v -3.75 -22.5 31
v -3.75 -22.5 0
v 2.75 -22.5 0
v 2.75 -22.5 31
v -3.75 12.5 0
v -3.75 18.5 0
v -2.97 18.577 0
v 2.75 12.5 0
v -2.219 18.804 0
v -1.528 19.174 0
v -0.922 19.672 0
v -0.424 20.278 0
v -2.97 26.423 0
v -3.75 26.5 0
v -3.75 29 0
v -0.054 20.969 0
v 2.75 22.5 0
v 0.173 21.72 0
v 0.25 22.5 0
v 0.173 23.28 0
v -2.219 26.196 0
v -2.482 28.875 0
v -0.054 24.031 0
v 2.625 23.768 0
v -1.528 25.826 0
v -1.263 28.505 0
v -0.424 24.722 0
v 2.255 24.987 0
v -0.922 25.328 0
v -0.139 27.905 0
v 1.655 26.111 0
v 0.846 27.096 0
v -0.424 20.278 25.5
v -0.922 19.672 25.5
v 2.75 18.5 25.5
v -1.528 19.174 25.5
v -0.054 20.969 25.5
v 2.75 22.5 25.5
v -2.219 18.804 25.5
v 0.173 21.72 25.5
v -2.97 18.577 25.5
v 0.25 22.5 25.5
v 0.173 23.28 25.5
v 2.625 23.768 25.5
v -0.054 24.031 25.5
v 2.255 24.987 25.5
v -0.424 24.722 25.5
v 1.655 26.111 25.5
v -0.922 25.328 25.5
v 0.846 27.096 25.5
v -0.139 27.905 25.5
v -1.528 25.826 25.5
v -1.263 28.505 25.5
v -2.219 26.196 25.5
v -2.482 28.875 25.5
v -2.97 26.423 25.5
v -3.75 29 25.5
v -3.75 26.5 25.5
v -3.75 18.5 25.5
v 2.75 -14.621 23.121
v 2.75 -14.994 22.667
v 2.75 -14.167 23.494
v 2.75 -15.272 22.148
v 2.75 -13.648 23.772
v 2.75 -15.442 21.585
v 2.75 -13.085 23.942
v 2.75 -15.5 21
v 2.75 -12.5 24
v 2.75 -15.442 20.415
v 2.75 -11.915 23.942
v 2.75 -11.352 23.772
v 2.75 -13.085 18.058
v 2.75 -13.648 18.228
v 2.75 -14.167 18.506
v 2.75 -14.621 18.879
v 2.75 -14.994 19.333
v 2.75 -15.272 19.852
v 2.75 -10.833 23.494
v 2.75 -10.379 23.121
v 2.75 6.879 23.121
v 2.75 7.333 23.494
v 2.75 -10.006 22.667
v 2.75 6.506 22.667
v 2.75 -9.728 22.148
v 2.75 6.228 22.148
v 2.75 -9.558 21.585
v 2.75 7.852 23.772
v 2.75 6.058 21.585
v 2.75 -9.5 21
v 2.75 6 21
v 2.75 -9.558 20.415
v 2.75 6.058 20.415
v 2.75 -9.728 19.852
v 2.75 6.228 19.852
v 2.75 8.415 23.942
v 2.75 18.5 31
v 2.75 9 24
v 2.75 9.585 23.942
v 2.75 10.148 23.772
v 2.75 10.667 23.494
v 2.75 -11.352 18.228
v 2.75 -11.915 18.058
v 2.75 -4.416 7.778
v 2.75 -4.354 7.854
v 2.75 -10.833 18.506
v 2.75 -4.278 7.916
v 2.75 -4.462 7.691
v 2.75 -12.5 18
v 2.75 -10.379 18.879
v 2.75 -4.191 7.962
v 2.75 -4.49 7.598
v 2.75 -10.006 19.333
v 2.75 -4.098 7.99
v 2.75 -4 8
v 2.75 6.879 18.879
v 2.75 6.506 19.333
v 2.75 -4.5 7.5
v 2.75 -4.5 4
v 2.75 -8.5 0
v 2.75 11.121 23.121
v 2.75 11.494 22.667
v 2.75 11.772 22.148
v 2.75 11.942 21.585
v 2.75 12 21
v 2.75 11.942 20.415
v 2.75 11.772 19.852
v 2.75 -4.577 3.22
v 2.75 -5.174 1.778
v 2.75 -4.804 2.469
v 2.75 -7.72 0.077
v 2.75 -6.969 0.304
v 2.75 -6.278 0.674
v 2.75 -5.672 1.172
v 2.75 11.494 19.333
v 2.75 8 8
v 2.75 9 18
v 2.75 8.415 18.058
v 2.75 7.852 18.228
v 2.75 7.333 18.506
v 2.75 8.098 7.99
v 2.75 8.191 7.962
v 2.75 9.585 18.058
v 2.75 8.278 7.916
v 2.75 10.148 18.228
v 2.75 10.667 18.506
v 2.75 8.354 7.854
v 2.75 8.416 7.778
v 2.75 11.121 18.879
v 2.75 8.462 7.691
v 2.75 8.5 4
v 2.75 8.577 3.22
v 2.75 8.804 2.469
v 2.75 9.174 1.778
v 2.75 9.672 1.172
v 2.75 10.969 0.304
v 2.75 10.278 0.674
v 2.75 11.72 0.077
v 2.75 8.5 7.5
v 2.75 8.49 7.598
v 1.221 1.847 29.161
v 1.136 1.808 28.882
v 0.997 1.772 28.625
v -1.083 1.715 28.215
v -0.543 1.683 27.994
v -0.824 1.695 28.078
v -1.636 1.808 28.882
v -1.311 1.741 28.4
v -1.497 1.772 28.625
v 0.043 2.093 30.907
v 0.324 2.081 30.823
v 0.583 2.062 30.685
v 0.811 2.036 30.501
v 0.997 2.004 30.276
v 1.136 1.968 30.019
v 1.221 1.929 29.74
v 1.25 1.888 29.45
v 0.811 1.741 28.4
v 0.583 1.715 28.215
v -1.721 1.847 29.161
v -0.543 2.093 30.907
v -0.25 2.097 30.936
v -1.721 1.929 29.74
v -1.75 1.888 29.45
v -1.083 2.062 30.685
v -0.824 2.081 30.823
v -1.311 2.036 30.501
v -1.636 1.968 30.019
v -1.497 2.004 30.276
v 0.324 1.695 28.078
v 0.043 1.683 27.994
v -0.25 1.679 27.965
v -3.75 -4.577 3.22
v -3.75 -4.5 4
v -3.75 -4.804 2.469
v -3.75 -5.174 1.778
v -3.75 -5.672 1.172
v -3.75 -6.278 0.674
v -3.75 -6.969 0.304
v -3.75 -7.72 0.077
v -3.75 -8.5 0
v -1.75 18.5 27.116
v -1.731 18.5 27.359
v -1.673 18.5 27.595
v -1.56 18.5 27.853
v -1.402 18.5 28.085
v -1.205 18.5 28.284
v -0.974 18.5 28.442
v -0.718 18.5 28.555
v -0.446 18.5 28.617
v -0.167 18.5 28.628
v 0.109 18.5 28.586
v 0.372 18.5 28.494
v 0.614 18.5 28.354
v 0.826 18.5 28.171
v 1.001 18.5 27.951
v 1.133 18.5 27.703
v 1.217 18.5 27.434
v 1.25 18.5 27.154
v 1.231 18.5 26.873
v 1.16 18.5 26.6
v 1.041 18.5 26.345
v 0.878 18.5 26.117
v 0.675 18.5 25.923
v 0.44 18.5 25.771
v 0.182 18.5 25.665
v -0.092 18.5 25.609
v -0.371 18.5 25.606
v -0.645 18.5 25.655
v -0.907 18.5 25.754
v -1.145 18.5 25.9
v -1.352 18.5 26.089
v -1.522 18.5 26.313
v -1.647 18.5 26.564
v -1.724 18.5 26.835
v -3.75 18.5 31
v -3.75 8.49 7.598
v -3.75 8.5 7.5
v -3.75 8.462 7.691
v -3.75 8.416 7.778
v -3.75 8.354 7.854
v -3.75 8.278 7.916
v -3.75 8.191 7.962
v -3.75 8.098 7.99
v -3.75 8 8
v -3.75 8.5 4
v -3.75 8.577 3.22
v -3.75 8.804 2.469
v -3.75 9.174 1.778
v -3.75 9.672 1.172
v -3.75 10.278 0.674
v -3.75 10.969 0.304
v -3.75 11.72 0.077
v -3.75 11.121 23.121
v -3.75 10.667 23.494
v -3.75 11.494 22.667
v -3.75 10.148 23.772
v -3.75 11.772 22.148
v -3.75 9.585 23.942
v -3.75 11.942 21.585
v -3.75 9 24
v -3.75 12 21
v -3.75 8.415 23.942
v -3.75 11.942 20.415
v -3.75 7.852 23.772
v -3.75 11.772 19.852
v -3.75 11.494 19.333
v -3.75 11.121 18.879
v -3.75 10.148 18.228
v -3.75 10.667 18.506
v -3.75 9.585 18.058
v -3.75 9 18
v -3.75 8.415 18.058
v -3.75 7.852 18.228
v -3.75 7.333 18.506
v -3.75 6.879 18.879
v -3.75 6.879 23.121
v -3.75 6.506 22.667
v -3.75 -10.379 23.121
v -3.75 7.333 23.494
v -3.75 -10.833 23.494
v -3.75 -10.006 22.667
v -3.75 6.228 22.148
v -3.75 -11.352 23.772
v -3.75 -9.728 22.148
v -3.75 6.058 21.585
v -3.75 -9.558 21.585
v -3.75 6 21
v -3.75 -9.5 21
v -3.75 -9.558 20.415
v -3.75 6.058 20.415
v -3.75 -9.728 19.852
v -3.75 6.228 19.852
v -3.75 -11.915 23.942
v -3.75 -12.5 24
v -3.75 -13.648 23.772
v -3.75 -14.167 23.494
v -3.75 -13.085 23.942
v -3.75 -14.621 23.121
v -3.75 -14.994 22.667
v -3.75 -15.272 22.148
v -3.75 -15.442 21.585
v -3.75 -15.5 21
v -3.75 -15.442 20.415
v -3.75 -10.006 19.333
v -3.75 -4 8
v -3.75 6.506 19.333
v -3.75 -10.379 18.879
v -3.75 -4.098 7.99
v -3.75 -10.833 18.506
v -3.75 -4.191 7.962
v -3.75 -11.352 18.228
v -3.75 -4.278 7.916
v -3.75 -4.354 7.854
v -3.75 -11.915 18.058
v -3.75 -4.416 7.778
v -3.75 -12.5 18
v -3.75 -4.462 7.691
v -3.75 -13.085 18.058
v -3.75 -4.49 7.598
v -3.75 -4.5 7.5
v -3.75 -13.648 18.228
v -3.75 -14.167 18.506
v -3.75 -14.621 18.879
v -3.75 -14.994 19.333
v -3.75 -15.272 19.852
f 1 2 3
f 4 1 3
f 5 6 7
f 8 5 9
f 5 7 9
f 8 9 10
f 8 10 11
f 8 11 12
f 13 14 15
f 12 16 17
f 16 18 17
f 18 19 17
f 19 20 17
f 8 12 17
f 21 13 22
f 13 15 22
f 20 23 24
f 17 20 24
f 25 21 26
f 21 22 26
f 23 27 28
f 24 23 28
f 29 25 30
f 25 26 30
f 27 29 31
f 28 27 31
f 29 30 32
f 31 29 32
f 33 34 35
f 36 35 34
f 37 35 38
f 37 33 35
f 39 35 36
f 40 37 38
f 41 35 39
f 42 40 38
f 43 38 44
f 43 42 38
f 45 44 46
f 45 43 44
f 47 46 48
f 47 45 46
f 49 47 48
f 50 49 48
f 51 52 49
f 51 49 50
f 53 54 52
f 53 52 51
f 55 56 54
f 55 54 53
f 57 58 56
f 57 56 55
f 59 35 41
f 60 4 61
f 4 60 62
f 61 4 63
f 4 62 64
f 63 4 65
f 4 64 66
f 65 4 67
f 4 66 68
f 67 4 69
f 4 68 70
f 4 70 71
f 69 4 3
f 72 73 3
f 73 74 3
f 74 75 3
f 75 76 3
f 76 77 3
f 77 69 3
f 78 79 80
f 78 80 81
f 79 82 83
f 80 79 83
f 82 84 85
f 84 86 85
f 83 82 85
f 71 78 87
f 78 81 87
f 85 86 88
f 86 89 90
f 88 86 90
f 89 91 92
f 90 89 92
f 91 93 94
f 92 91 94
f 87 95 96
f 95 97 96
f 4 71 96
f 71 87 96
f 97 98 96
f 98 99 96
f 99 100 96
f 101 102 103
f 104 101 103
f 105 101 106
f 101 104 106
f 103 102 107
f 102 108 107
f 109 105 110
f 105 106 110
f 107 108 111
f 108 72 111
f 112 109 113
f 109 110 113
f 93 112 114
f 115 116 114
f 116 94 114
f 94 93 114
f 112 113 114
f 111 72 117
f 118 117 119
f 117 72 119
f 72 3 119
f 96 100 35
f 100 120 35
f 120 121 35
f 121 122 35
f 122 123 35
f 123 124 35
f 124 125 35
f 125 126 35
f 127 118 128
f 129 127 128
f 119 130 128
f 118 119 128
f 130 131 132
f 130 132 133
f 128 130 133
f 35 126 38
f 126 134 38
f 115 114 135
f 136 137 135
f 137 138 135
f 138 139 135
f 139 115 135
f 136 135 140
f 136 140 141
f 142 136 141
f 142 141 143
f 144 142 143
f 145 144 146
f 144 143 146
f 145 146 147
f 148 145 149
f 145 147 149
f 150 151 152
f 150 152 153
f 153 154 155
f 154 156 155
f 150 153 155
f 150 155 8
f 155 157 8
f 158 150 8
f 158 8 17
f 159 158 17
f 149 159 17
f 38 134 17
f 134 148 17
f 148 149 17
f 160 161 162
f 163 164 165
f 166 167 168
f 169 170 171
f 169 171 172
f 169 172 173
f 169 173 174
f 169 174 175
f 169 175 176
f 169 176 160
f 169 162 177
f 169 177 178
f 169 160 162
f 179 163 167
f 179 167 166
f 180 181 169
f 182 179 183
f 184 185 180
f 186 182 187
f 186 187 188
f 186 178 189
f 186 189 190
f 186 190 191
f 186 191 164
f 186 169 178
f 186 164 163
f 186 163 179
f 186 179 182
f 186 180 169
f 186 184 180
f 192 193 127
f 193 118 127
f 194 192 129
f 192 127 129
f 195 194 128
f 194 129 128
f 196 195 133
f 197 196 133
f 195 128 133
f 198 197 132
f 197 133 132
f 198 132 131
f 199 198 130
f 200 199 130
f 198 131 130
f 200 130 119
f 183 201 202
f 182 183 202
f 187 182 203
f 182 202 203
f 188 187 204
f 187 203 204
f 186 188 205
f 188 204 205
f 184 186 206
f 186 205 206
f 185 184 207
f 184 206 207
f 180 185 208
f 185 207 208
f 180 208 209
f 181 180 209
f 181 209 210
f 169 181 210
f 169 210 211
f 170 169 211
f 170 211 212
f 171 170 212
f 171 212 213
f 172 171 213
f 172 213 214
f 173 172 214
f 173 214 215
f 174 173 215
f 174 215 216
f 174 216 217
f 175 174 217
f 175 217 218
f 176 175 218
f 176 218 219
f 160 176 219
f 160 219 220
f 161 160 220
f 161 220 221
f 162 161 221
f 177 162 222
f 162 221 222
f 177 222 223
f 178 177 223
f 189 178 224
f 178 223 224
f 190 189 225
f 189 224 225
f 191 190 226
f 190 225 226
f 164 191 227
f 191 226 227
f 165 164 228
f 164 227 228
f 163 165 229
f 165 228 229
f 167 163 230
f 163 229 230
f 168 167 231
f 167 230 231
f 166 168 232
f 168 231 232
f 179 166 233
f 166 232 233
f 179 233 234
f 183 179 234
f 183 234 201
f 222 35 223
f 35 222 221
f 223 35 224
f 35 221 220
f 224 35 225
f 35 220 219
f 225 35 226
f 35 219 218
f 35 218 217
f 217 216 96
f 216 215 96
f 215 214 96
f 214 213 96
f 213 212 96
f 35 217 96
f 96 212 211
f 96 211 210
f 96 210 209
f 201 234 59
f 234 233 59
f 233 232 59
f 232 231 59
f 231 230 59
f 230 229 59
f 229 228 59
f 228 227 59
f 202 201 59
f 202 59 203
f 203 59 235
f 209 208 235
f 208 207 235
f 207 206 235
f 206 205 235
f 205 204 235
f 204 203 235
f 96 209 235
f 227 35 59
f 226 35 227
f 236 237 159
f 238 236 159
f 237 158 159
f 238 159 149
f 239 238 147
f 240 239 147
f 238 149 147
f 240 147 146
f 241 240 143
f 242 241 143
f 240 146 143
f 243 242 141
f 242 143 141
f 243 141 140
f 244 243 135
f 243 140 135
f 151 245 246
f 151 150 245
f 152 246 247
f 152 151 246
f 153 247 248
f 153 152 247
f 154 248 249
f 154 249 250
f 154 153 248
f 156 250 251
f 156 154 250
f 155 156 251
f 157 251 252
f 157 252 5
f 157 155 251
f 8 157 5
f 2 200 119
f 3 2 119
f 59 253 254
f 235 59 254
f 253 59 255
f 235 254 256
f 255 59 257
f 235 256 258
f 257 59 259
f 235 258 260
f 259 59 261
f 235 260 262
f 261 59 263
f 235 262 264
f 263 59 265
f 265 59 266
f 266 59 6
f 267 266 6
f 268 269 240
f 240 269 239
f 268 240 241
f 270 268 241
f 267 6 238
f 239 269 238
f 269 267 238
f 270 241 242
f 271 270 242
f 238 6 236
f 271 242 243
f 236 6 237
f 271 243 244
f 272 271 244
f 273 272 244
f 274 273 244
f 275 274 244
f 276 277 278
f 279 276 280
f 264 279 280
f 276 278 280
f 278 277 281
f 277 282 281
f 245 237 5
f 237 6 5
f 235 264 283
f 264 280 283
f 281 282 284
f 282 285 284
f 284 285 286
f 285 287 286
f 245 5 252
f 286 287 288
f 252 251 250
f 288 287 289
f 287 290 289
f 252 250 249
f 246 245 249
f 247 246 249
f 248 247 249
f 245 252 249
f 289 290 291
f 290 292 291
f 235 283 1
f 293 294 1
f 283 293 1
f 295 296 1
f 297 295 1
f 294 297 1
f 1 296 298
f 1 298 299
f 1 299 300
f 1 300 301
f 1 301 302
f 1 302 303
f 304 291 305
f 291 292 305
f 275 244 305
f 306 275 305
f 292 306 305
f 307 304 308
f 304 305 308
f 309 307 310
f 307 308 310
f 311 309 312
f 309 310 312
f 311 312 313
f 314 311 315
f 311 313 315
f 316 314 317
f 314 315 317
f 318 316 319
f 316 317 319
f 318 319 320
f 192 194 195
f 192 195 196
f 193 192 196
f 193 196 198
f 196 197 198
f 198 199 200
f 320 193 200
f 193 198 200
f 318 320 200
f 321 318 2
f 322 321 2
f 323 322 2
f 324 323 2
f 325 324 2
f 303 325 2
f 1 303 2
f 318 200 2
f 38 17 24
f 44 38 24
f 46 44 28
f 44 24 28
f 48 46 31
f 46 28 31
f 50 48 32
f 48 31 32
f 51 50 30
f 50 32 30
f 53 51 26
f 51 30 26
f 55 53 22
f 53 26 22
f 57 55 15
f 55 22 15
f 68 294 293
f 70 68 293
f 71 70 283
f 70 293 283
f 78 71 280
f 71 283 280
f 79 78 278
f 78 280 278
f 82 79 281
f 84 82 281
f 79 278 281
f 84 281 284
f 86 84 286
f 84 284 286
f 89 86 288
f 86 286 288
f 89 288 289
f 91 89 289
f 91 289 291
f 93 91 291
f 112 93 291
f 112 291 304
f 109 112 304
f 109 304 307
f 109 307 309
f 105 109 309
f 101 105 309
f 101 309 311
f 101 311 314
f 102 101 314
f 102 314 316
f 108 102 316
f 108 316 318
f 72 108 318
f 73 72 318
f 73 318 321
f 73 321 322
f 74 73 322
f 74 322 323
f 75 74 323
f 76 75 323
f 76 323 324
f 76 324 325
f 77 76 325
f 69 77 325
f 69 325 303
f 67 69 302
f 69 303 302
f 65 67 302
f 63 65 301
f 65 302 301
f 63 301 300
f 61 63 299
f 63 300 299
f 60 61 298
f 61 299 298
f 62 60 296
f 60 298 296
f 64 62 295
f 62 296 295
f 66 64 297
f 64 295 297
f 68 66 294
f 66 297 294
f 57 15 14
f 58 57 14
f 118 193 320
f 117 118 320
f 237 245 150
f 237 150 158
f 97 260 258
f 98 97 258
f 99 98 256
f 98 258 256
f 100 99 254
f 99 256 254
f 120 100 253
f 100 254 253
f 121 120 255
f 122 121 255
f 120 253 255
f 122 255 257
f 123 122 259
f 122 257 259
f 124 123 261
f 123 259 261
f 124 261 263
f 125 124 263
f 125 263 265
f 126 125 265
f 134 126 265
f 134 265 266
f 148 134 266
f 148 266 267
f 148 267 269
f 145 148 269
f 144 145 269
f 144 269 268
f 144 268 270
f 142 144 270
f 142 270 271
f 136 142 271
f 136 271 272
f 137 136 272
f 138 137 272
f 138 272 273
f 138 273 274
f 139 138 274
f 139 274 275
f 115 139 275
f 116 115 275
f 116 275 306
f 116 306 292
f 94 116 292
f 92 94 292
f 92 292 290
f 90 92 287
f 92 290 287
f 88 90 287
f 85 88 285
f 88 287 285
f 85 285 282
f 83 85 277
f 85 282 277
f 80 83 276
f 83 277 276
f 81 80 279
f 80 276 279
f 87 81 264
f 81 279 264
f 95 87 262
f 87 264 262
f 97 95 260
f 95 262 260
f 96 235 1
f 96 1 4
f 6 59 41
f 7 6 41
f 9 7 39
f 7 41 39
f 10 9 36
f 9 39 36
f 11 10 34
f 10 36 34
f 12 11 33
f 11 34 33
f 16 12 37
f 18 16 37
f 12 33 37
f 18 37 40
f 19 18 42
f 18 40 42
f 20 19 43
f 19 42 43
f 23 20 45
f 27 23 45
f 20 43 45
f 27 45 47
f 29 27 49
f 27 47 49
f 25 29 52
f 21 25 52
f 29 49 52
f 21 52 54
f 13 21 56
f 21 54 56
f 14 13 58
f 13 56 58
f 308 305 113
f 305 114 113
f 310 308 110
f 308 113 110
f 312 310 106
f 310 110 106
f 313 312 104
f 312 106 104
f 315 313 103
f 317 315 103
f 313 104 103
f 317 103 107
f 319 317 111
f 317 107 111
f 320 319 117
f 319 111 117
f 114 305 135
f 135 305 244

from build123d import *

# Parameters (mm, degrees)
BOSS_EXTRUDE1_DEPTH = 31
SKETCH2_W           = 5.5
SKETCH2_H           = 10.5
CUT_EXTRUDE1_DEPTH  = 7.5
SKETCH3_R           = 3
CUT_EXTRUDE2_DEPTH  = 7.5
CUT_EXTRUDE5_REACH  = 8.5
SKETCH6_W           = 8
SKETCH6_H           = 13
FILLET1_R           = 0.5
FILLET2_R           = 4
CUT_EXTRUDE7_REACH  = 27.5
SKETCH9_R           = 1.5
CUT_EXTRUDE8_DEPTH  = 17


with BuildPart() as part:
    # Sketch1 → Boss-Extrude1 (new body)
    with BuildSketch(Plane.XY):
        with BuildLine():
            Line((-3.75, 29), (-3.75, 22.5))
            Line((-3.75, 22.5), (-3.75, -22.5))
            Line((-3.75, -22.5), (2.75, -22.5))
            Line((2.75, -22.5), (2.75, 22.5))
            ThreePointArc((2.75, 22.5), (0.846194078, 27.096194078), (-3.75, 29))
        make_face()
    extrude(amount=BOSS_EXTRUDE1_DEPTH)

    # Sketch2 → Cut-Extrude1 (cut, through all)
    with BuildSketch(Plane.ZY.offset(3.75)):
        with Locations((28.25, 23.75)):
            Rectangle(SKETCH2_W, SKETCH2_H)
    extrude(amount=-CUT_EXTRUDE1_DEPTH, mode=Mode.SUBTRACT)

    # Sketch3 → Cut-Extrude2 (cut, through all)
    with BuildSketch(Plane.ZY.offset(3.75)):
        with Locations((21, 9)):
            Circle(SKETCH3_R)
        with Locations((21, -12.5)):
            Circle(SKETCH3_R)
    extrude(amount=-CUT_EXTRUDE2_DEPTH, mode=Mode.SUBTRACT)

    # Sketch6 → Cut-Extrude5 (cut, up to next)
    with BuildSketch(Plane.ZY.offset(3.75), mode=Mode.PRIVATE) as cut_extrude5_sk1:
        with Locations((4, 2)):
            Rectangle(SKETCH6_W, SKETCH6_H)
    cut_extrude5_tool1 = extrude(cut_extrude5_sk1.sketch, amount=-CUT_EXTRUDE5_REACH, mode=Mode.PRIVATE) & part.part
    add(cut_extrude5_tool1.solids().sort_by_distance((-3.75, 2, 4))[0], mode=Mode.SUBTRACT)

    # Fillet1
    fillet1_edges = [part.edges().sort_by_distance(p)[0] for p in [
        (-0.5, 8.5, 8),
        (-0.5, -4.5, 8),
    ]]
    fillet(fillet1_edges, radius=FILLET1_R)

    # Fillet2
    fillet2_edges = [part.edges().sort_by_distance(p)[0] for p in [
        (-0.5, -4.5, 0),
        (-0.5, 8.5, 0),
    ]]
    fillet(fillet2_edges, radius=FILLET2_R)

    # Sketch8 → Cut-Extrude7 (cut, up to next)
    with BuildSketch(Plane.XY.offset(25.5), mode=Mode.PRIVATE) as cut_extrude7_sk1:
        with BuildLine():
            Line((-3.75, 26.5), (-3.75, 18.5))
            ThreePointArc((-3.75, 18.5), (0.25, 22.5), (-3.75, 26.5))
        make_face()
    cut_extrude7_tool1 = extrude(cut_extrude7_sk1.sketch, amount=-CUT_EXTRUDE7_REACH, mode=Mode.PRIVATE) & part.part
    add(cut_extrude7_tool1.solids().sort_by_distance((-2.052347, 22.5, 25.5))[0], mode=Mode.SUBTRACT)

    # Sketch9 → Cut-Extrude8 (cut)
    with BuildSketch(Plane(origin=(0, 14.627294401, -2.055732165), x_dir=(-1, 0, 0), z_dir=(0, 0.990268069, -0.139173101))):
        with Locations((0.25, 29.426538121)):
            Circle(SKETCH9_R)
    extrude(amount=-CUT_EXTRUDE8_DEPTH, mode=Mode.SUBTRACT)


solid = part.part
